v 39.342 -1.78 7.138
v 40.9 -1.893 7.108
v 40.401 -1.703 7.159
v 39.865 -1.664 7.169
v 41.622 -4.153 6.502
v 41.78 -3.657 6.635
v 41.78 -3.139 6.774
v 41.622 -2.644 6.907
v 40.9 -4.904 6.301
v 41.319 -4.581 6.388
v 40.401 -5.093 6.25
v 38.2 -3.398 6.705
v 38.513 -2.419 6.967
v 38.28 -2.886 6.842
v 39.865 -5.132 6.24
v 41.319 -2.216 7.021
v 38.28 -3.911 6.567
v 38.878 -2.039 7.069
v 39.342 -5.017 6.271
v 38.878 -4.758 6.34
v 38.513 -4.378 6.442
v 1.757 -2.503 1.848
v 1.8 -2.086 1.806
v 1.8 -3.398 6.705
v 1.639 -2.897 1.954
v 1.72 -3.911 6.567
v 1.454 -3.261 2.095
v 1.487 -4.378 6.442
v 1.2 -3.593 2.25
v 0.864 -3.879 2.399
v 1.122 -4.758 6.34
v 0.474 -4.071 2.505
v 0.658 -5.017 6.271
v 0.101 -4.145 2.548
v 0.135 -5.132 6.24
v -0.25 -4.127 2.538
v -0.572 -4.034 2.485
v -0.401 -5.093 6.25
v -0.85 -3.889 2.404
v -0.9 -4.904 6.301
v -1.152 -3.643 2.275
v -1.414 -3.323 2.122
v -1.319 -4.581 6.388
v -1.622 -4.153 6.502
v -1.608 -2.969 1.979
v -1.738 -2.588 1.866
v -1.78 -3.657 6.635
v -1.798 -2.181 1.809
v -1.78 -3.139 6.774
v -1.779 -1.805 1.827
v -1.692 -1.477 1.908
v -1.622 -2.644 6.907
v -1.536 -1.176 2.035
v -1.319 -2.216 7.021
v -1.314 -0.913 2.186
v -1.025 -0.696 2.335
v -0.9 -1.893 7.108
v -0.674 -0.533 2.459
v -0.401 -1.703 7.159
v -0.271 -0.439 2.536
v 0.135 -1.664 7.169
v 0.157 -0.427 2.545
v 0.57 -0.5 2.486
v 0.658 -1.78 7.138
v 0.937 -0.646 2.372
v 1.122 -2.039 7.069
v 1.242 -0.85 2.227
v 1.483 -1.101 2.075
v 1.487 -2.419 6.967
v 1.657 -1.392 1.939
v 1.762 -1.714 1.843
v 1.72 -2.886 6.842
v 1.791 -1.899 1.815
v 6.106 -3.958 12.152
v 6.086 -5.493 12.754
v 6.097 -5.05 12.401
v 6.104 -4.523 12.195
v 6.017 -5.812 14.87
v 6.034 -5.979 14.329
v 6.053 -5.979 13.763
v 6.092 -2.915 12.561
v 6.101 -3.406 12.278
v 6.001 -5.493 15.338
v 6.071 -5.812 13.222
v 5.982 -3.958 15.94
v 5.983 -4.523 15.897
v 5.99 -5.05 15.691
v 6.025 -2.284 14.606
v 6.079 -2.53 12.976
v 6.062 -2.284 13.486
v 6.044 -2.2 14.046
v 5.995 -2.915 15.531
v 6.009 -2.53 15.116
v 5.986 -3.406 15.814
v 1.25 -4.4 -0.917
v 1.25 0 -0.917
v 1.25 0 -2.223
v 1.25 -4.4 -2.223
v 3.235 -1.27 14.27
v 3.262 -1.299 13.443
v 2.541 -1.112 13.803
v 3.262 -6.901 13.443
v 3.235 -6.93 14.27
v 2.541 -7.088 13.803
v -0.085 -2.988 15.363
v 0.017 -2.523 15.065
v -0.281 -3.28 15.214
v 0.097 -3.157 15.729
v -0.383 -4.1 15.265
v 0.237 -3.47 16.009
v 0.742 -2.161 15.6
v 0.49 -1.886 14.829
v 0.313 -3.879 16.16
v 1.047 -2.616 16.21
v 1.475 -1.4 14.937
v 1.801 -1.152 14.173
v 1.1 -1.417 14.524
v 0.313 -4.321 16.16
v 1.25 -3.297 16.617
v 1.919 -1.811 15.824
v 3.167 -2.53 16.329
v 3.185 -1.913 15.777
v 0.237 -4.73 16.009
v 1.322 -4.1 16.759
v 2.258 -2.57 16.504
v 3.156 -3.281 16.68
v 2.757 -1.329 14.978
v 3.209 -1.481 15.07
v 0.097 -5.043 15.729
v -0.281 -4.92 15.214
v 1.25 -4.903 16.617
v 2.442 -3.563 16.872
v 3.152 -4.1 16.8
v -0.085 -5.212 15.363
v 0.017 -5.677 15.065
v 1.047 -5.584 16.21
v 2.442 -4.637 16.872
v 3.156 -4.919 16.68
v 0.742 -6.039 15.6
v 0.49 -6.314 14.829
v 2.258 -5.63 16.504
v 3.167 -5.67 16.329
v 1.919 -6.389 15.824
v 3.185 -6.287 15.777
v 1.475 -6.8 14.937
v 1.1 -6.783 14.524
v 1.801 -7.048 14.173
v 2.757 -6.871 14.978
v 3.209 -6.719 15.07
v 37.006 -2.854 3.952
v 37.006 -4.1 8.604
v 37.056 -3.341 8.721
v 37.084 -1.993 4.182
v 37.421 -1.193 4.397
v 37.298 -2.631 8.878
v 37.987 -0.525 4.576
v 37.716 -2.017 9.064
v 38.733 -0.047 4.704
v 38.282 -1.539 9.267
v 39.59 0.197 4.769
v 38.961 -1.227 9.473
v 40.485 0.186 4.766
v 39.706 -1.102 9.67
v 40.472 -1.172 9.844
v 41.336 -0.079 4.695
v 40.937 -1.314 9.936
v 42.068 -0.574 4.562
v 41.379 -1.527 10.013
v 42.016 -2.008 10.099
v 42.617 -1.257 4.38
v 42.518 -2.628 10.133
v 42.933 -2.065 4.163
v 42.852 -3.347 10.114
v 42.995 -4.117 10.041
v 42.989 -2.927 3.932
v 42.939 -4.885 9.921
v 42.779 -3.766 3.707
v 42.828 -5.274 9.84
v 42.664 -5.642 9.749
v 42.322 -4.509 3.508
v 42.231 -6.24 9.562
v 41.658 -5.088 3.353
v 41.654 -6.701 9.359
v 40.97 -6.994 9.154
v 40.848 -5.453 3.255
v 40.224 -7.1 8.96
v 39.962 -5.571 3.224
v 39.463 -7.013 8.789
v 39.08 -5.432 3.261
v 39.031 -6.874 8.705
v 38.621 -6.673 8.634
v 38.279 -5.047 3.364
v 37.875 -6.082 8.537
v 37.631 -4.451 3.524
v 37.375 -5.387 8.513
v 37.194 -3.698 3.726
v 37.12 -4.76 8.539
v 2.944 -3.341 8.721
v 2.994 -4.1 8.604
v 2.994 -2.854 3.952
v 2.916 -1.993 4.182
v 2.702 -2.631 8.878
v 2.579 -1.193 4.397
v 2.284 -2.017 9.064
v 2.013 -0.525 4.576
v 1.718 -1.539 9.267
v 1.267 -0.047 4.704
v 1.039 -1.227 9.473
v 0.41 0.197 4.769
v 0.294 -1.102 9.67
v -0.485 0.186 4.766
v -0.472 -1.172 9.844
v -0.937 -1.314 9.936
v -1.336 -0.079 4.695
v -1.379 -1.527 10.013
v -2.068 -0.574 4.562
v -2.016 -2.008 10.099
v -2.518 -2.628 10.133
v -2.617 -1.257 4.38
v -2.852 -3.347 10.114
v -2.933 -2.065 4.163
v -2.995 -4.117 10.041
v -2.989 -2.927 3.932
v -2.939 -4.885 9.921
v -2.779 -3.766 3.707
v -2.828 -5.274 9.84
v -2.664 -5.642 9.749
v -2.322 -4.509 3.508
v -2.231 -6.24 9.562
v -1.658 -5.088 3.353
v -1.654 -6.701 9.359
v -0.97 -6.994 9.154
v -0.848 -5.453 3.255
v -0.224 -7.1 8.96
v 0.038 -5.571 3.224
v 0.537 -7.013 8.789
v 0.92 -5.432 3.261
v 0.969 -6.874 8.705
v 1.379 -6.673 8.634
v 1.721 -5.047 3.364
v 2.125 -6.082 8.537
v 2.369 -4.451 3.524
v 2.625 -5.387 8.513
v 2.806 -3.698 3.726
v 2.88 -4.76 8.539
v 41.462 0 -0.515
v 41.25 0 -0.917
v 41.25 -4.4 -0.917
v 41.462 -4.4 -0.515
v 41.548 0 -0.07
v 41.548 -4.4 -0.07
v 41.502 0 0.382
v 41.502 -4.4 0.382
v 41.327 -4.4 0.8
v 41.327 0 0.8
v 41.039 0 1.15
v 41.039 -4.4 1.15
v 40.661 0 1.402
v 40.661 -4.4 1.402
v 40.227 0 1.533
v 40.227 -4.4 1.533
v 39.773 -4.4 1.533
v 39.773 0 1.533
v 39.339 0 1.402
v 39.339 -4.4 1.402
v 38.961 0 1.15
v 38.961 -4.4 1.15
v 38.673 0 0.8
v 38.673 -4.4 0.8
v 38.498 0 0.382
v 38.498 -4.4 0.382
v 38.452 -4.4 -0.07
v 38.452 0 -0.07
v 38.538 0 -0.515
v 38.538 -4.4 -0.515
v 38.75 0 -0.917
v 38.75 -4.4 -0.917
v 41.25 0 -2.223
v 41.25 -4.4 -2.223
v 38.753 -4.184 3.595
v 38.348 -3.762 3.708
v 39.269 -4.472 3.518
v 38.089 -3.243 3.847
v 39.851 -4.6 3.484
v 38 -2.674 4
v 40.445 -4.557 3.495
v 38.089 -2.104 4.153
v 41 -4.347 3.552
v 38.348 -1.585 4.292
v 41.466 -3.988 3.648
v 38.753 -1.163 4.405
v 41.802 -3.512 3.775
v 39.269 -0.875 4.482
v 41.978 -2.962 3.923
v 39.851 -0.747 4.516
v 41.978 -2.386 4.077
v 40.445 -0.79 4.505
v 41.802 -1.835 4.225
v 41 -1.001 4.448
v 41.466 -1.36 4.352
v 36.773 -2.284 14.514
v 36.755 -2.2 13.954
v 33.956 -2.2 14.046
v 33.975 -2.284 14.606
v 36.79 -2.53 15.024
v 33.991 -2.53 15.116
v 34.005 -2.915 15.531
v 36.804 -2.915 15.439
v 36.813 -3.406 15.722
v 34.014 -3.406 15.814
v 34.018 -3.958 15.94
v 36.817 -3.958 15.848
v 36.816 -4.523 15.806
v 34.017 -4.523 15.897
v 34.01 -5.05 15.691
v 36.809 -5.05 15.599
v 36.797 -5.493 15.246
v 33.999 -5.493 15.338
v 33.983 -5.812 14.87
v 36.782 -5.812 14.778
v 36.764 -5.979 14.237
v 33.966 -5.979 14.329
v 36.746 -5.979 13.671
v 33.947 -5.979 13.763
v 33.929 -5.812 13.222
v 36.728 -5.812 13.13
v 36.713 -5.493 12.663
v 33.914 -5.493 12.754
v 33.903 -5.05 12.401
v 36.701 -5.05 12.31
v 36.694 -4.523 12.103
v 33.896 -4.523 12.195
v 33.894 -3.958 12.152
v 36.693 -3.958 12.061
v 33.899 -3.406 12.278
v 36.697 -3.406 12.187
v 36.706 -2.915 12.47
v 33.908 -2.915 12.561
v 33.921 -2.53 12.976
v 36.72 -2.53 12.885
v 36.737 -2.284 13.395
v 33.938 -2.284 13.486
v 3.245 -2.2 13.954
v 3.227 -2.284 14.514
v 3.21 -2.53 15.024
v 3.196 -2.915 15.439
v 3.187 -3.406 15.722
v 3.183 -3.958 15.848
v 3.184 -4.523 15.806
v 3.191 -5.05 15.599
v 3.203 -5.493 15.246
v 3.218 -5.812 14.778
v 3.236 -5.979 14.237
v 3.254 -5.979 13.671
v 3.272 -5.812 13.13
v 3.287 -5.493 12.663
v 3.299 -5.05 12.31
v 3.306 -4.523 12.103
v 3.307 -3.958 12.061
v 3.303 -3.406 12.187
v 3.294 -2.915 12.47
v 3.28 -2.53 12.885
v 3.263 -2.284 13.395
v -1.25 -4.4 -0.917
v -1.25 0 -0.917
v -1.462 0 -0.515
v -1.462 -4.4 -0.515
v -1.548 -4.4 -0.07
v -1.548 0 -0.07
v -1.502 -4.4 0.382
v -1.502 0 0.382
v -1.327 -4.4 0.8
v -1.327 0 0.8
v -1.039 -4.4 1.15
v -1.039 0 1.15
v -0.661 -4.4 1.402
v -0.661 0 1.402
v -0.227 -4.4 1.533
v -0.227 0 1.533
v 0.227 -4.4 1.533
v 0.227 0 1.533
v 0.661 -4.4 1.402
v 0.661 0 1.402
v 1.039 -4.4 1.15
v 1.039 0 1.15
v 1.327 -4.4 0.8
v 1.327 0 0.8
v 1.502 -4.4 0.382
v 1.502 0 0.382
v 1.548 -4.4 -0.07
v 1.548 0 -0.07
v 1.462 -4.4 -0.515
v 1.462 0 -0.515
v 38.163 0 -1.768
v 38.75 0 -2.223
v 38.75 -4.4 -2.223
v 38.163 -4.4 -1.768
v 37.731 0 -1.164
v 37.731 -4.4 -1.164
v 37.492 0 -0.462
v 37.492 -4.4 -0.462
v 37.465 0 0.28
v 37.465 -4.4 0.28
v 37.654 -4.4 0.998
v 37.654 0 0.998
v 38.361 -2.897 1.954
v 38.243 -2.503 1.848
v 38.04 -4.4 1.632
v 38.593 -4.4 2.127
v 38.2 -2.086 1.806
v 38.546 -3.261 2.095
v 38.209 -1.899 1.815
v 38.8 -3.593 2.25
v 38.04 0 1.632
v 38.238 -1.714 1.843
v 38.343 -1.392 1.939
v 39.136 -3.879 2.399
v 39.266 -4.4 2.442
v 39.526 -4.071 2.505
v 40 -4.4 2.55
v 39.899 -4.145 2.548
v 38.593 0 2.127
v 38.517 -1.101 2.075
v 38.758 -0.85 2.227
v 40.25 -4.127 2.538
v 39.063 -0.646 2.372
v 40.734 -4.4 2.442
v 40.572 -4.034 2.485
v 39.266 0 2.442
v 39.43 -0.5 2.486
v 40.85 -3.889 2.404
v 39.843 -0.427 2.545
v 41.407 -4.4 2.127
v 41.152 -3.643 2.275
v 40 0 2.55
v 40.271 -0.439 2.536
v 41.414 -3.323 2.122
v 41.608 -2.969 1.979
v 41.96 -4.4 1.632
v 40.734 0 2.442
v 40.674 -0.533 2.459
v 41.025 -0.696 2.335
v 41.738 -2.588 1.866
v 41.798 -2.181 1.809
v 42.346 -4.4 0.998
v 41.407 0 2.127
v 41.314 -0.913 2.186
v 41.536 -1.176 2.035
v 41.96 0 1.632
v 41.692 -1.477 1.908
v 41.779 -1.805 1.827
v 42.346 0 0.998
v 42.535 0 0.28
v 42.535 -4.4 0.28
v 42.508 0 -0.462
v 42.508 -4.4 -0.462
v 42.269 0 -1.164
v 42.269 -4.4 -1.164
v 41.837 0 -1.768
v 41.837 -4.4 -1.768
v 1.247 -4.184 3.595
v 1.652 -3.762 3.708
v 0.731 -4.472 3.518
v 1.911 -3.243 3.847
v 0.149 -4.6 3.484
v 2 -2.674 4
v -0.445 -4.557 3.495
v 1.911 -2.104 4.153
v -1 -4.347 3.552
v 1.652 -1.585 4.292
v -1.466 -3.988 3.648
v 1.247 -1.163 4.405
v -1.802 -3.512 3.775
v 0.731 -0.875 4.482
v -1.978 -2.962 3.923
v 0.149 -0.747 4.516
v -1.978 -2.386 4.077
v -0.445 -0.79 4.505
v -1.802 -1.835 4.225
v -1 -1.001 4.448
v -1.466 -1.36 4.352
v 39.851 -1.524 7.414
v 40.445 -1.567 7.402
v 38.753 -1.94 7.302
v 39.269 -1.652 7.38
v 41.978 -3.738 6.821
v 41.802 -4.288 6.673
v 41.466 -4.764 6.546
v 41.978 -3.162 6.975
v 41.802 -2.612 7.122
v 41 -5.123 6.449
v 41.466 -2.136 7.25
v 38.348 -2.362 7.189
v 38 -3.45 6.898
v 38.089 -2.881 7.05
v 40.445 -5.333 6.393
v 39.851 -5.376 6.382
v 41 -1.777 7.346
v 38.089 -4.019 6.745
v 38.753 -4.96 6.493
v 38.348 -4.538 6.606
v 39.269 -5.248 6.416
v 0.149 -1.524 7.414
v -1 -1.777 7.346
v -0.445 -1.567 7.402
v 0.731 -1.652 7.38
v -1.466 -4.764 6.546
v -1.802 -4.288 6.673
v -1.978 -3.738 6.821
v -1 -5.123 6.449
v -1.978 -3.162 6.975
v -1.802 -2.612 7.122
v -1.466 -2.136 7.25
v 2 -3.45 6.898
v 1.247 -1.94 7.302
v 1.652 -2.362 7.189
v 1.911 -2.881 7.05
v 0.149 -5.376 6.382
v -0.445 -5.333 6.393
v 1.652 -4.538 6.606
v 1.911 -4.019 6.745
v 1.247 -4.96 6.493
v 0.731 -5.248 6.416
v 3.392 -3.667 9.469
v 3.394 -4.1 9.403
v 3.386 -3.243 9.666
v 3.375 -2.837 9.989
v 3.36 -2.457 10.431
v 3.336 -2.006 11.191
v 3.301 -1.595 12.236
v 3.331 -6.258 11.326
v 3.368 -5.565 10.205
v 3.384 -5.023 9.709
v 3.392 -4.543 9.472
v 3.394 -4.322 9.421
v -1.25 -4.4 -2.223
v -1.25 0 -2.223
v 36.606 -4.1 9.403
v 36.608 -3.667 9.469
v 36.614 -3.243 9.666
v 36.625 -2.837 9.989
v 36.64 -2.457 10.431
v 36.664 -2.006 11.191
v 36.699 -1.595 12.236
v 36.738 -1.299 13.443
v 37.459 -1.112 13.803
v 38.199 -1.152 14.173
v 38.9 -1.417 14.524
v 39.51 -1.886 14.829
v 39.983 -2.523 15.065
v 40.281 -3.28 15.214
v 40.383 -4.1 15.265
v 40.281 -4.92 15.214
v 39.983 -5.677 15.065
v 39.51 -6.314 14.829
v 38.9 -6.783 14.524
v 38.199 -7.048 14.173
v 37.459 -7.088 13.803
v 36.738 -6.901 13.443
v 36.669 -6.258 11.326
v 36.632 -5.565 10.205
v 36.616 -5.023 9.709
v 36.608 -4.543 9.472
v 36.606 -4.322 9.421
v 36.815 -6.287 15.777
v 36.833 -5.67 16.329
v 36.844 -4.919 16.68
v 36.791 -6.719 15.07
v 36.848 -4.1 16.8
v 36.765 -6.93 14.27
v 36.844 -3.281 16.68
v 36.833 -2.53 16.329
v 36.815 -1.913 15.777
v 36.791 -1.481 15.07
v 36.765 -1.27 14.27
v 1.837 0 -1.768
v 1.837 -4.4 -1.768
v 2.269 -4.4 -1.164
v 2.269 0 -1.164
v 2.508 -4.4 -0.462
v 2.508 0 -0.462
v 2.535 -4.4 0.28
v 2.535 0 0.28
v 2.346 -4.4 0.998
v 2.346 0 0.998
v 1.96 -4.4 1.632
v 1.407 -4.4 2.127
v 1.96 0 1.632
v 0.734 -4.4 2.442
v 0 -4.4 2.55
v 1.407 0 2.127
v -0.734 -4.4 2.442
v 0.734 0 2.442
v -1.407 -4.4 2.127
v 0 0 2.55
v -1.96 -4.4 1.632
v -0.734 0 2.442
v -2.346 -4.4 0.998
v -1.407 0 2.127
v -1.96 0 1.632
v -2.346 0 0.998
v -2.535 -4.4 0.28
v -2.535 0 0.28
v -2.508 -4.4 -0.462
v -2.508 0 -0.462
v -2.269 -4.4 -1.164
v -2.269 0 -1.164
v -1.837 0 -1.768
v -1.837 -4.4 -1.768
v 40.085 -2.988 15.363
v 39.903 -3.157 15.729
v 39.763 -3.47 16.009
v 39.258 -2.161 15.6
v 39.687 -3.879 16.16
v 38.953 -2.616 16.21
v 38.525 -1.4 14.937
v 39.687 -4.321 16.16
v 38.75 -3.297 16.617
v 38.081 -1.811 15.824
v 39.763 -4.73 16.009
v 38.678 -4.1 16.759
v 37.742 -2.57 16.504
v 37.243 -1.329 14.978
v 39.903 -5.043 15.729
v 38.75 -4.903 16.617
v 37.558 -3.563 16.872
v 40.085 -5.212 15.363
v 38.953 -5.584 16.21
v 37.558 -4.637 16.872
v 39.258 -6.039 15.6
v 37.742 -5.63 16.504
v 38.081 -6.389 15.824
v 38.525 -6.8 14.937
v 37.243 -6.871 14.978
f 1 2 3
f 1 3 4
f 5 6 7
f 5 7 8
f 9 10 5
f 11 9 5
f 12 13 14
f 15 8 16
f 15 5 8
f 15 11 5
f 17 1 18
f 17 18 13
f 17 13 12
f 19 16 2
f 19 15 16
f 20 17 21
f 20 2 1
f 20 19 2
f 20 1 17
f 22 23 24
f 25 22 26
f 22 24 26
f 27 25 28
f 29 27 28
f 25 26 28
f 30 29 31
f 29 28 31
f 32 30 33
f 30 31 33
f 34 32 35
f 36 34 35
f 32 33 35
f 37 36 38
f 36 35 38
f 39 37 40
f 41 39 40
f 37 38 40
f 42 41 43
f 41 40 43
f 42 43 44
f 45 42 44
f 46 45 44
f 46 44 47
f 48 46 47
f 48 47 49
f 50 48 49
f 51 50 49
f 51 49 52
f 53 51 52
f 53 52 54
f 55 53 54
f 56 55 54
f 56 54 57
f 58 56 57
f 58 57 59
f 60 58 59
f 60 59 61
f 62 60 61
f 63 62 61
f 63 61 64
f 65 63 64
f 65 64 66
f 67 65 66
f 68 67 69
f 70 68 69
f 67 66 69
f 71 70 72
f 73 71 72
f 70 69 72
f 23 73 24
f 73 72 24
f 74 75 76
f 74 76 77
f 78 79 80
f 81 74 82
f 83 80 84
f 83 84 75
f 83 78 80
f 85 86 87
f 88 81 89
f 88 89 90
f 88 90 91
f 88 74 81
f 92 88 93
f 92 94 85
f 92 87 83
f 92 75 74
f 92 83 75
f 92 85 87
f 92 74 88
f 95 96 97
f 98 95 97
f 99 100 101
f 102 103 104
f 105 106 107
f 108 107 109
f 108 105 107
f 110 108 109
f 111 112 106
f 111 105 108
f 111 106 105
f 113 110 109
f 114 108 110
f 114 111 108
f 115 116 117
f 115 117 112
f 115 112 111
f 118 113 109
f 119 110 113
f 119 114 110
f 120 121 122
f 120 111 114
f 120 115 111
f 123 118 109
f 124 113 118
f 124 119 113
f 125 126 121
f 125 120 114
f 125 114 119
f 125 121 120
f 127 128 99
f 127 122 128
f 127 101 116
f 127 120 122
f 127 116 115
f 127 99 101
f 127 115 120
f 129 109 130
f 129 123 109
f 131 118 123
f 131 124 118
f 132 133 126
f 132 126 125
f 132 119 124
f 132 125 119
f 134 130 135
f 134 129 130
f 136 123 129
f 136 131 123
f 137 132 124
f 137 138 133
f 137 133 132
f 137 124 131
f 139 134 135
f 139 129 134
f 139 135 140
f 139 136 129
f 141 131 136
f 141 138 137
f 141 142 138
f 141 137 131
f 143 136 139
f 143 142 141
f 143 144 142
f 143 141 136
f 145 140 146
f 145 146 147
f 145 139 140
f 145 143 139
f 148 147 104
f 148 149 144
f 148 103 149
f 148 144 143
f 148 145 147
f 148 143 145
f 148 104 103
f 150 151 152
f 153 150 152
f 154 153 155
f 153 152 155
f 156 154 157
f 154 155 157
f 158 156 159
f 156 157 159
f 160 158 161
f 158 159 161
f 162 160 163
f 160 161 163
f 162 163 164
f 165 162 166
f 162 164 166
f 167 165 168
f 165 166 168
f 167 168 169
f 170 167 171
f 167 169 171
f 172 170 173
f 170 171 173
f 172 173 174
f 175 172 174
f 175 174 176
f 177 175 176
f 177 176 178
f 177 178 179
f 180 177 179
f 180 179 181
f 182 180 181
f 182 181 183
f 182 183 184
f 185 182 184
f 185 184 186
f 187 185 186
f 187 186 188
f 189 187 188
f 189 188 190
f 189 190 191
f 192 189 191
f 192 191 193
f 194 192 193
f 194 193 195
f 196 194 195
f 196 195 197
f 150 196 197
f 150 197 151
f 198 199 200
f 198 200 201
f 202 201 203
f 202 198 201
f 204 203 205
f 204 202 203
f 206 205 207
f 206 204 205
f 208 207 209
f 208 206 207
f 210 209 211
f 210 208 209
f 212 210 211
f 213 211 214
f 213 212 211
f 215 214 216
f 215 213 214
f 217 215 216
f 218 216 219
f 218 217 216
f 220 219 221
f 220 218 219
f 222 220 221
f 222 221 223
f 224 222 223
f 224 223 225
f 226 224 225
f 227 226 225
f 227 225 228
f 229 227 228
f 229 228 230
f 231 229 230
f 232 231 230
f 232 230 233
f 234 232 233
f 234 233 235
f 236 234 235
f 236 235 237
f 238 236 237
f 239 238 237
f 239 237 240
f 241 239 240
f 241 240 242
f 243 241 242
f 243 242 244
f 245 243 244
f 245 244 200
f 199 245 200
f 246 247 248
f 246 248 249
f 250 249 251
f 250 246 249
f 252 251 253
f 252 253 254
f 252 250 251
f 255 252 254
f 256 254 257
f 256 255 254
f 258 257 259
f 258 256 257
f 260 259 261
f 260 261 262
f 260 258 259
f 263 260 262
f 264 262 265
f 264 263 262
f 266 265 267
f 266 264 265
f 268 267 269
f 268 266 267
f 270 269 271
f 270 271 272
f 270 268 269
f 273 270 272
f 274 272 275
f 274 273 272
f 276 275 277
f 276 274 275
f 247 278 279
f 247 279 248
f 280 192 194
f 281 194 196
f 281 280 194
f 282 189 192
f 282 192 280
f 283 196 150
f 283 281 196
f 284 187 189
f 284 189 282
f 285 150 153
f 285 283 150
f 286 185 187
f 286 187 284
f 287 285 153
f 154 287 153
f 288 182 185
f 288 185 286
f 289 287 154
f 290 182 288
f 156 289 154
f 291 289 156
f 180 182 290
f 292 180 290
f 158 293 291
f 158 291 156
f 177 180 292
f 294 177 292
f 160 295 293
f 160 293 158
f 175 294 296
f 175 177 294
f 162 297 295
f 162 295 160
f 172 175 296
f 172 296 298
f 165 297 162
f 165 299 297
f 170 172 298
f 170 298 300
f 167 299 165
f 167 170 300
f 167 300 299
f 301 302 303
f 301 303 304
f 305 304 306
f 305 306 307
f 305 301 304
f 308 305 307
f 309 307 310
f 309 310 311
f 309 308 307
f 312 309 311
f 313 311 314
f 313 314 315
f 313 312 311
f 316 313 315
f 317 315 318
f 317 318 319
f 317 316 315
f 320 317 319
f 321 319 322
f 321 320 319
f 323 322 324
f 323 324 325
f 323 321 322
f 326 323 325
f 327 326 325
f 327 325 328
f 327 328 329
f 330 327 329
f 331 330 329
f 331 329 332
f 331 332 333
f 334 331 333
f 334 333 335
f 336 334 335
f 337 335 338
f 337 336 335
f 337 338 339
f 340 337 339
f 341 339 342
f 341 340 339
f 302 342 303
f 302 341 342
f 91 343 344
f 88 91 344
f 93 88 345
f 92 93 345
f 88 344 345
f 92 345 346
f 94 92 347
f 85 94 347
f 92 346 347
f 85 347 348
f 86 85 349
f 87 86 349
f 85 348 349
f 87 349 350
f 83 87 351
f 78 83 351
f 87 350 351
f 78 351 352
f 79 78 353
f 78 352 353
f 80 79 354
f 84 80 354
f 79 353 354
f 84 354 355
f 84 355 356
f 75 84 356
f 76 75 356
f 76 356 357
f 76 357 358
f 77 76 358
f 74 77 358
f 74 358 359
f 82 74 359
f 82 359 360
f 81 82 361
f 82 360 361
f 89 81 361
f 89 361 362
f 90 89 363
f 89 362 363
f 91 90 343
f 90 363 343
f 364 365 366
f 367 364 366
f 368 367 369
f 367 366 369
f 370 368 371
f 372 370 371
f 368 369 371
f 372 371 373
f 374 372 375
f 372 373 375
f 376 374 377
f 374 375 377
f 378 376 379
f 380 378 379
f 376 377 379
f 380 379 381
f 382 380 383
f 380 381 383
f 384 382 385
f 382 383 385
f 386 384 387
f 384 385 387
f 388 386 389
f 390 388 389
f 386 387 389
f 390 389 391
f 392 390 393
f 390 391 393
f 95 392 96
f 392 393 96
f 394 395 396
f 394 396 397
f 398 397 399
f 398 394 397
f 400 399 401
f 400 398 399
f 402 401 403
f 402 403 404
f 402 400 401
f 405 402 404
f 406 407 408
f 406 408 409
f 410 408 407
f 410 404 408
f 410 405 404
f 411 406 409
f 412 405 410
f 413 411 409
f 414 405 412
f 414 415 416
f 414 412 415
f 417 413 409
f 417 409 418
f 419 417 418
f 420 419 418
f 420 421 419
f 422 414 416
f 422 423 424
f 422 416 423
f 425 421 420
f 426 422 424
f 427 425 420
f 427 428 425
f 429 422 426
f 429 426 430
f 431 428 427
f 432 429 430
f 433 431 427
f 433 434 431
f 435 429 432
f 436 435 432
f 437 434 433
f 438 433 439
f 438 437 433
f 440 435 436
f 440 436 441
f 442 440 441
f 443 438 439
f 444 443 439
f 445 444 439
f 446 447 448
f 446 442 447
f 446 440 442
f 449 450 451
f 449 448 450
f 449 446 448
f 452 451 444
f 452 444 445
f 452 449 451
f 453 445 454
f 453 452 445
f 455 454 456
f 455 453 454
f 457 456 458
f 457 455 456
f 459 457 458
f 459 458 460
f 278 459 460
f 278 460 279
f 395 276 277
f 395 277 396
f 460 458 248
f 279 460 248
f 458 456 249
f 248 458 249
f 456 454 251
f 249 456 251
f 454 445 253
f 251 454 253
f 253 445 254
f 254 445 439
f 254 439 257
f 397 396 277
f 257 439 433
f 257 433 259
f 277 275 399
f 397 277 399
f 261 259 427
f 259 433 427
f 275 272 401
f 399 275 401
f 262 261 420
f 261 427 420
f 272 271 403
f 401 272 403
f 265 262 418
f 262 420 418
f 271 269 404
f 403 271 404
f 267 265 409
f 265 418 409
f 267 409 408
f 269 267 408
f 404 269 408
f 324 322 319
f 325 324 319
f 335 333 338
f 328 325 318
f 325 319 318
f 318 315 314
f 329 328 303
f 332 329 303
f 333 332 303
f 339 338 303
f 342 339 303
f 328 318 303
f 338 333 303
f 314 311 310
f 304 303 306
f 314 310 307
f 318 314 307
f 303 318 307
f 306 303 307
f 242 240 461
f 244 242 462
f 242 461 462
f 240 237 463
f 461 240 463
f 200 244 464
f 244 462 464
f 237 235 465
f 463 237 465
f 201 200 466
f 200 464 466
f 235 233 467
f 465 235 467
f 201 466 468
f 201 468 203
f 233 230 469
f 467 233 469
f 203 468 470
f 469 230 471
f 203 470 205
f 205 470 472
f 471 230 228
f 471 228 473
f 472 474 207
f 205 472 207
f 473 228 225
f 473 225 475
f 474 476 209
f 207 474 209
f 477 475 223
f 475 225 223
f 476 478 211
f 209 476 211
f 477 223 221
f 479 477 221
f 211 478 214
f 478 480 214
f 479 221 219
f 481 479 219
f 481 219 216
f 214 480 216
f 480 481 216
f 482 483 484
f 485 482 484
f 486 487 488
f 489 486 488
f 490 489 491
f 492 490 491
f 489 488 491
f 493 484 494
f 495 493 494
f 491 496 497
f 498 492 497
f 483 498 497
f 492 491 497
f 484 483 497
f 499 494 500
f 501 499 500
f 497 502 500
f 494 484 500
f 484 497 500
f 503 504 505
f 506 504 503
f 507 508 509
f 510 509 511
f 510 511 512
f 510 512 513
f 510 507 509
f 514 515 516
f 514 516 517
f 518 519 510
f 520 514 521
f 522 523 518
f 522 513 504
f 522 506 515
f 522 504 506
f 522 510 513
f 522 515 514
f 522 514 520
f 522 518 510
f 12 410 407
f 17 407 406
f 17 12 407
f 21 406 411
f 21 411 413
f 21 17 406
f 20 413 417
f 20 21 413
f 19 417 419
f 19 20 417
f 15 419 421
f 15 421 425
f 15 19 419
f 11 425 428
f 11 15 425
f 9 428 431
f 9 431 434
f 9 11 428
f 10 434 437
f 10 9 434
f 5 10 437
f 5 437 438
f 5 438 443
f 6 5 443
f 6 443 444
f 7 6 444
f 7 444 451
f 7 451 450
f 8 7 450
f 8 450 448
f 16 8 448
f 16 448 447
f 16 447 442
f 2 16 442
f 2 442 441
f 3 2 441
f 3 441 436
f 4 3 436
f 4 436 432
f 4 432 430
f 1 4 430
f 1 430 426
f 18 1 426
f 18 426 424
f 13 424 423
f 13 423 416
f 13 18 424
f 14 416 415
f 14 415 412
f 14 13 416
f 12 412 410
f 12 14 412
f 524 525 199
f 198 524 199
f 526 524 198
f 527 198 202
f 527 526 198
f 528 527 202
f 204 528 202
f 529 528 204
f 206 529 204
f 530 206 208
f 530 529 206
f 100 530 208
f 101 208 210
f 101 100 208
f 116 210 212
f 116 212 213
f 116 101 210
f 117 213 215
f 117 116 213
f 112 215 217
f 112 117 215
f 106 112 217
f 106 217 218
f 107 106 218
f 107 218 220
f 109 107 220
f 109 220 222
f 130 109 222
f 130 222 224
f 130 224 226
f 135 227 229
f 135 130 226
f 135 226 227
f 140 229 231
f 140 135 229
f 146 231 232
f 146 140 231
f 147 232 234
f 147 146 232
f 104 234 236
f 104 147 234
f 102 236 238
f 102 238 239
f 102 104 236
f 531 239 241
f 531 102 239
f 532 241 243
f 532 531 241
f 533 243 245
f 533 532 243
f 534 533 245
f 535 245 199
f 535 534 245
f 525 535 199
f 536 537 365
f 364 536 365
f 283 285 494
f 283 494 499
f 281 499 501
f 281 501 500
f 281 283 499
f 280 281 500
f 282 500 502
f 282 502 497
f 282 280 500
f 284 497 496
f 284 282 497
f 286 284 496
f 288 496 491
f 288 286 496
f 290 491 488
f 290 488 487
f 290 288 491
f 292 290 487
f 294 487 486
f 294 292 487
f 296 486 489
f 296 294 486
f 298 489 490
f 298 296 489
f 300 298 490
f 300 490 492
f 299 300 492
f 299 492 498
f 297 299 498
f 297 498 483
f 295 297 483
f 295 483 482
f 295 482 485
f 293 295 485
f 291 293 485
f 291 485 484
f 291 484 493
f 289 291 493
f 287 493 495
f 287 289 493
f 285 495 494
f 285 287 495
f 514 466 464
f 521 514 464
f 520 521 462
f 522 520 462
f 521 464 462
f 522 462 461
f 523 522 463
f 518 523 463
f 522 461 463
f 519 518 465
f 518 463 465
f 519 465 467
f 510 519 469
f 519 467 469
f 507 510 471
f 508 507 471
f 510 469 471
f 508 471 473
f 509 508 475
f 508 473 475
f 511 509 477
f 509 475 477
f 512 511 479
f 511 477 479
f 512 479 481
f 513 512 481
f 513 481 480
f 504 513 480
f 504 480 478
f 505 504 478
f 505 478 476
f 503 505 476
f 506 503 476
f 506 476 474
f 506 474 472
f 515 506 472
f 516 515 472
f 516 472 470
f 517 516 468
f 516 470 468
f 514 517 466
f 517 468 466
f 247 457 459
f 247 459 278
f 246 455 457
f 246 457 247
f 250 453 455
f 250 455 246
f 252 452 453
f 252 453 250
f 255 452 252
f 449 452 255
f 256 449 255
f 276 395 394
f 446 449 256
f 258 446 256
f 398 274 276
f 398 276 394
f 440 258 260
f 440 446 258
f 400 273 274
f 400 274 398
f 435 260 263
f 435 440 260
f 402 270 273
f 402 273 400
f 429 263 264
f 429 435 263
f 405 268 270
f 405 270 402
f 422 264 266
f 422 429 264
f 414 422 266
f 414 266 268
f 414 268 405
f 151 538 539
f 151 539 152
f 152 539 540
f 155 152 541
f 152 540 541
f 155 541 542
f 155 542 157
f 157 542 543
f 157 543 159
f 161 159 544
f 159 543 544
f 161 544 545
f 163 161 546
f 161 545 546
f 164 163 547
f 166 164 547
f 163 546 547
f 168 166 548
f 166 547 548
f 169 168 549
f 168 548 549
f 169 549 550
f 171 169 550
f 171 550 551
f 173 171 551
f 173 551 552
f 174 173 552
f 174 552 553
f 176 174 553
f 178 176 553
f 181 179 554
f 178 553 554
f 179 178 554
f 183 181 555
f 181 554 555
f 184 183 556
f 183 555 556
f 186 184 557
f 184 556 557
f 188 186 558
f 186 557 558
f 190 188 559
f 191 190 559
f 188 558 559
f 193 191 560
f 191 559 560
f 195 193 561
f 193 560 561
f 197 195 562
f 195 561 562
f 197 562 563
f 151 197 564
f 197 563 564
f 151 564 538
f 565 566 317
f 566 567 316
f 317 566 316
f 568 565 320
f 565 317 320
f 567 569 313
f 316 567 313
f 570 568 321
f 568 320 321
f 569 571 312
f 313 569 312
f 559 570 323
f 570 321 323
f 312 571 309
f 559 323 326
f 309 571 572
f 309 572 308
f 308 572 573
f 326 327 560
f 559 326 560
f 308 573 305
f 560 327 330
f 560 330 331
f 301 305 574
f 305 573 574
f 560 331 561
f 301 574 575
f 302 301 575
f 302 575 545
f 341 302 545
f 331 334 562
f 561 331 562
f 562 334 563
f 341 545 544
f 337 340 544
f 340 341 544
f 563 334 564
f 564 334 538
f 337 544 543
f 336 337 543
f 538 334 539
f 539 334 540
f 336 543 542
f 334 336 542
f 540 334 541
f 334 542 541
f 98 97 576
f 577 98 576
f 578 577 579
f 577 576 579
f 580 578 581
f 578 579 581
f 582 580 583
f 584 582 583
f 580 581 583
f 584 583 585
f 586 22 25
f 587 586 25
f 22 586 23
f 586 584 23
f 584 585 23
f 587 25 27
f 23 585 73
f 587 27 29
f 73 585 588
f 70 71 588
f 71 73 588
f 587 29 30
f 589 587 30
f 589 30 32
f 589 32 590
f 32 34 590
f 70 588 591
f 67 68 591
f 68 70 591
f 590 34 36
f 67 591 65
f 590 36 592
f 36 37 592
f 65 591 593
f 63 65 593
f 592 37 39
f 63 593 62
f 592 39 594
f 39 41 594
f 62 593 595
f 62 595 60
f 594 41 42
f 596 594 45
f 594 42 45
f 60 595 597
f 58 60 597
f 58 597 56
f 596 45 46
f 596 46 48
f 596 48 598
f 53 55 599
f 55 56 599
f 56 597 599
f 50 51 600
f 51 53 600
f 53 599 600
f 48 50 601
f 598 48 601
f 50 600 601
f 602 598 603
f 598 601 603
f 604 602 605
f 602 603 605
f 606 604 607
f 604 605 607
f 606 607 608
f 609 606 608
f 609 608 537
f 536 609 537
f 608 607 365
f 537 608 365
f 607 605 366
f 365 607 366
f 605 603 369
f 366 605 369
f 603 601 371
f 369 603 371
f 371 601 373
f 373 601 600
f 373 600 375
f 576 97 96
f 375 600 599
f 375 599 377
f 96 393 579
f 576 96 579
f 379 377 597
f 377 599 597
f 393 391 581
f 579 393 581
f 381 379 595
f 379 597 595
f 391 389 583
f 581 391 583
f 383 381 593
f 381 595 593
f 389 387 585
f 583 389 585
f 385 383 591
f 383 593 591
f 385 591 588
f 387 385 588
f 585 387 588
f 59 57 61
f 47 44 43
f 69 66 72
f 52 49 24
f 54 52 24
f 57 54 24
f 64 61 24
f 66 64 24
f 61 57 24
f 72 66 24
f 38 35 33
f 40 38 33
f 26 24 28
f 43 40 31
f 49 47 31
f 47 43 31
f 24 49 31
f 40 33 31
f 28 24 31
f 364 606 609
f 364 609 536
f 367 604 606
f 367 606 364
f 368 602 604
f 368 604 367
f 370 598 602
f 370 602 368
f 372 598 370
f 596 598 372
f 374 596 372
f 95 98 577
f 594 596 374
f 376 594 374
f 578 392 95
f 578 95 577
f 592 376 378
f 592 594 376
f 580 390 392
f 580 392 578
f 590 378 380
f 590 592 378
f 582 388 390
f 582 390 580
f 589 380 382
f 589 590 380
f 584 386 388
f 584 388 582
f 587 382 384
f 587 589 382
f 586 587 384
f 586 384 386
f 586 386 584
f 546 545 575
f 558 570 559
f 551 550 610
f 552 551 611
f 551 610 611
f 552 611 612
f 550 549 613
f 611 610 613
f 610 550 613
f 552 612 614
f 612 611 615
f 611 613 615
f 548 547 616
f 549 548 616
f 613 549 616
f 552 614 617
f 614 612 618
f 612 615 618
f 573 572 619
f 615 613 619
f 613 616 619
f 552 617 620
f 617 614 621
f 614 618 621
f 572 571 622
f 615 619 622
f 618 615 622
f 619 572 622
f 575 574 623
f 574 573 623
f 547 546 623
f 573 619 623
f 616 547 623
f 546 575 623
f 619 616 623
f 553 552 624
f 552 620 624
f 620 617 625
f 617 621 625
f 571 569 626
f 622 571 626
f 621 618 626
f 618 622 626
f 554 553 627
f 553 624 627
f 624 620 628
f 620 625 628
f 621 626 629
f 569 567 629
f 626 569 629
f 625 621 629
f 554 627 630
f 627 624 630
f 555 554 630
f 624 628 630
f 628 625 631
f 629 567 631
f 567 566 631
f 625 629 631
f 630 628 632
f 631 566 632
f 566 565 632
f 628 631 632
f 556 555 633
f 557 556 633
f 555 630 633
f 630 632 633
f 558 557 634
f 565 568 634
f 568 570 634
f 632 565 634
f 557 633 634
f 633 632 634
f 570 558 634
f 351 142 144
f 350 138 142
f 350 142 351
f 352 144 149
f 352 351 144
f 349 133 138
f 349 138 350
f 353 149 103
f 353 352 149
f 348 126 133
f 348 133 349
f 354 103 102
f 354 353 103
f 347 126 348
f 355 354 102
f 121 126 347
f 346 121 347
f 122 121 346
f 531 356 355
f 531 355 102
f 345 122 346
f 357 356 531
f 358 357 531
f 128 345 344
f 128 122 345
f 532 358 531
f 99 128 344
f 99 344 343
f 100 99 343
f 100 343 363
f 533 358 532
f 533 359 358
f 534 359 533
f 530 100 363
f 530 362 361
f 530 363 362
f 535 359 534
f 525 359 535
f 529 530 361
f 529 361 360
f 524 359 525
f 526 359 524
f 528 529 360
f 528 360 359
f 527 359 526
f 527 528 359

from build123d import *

# Parameters (mm, degrees)
F1_DEPTH  = 4.4
F6_R      = 3
F10_R     = 2
F11_DEPTH = 3
F13_R     = 1.8
F16_DEPTH = 25
F17_R     = 1.9
F18_DEPTH = 2.8


with BuildPart() as f1:
    # F0 (on Front) → F1 (new body)
    with BuildSketch(Plane.XZ):
        with BuildLine():
            Line((1.25, -0.916515139), (1.25, -2.2226110771))
            ThreePointArc((1.25, -2.2226110771), (0, 2.55), (-1.25, -2.2226110771))
            Line((-1.25, -2.2226110771), (-1.25, -0.916515139))
            ThreePointArc((-1.25, -0.916515139), (0, 1.55), (1.25, -0.916515139))
        make_face()
    extrude(amount=F1_DEPTH)

    # F13 (on offset) → F14 (join, up to the next surface of F1)
    with BuildSketch(Plane(origin=(0, -1.90378939, 7.1050387303), x_dir=(1, 0, 0), z_dir=(0, 0.2588190451, -0.9659258263))):
        with Locations((0, 1.5472061438)):
            Circle(F13_R)
    extrude(until=Until.NEXT)


with BuildPart() as f7:
    # F7: sweep along a path in F7_path
    with BuildLine(Plane(origin=(0, -2.6735824366, 4), x_dir=(-0.8814124167, -0.4723474905, 0), z_dir=(0.4597008434, -0.8578134519, -0.2298504217))) as f7_path:
        Line((0, 0), (0.6737647565, -5.4699144883))
        Line((0.6737647565, -5.4699144883), (-1.3534838018, -10.1964632591))
    # F6 (on line) → F7 (sweep)
    with BuildSketch(Plane(origin=(6.0293851278, 0, 12.0587702557), x_dir=(0.894427191, 0, -0.4472135955), z_dir=(0.4472135955, 0, 0.894427191))):
        with Locations((-4.16957933, -4.1)):
            Circle(F6_R)
    sweep(path=f7_path.line, transition=Transition.RIGHT)

    # F8 (on face) → F9 (revolve)
    with BuildSketch(Plane(origin=(6.0293851278, 0, 12.0587702557), x_dir=(0.894427191, 0, -0.4472135955), z_dir=(0.4472135955, 0, 0.894427191))):
        with BuildLine():
            Line((-1.16957933, -4.1), (-7.16957933, -4.1))
            ThreePointArc((-7.16957933, -4.1), (-4.16957933, -7.1), (-1.16957933, -4.1))
        make_face()
    revolve(axis=Axis((2.3, -4.1, 13.9234628196), (0.894427191, 0, -0.4472135955)))

    # F10 (on face) → F11 (cut)
    with BuildSketch(Plane(origin=(0, -1.1790960637, 4.4004464167), x_dir=(1, 0, 0), z_dir=(0, 0.2588190451, -0.9659258263))):
        with Locations((0, 1.5472061438)):
            Circle(F10_R)
    extrude(amount=-F11_DEPTH, mode=Mode.SUBTRACT)

    # F15 (on Front) → F16 (cut)
    with BuildSketch(Plane.XZ):
        Polygon((19.7431911525, 6.4305428985), (14.3870584792, 19.6048300817), (3.1383610708, 17.2138456373), (3.6037557404, 3), align=None)
    extrude(amount=F16_DEPTH, mode=Mode.SUBTRACT)

    # F17 (on face) → F18 (join)
    with BuildSketch(Plane(origin=(3.6980182798, 0, 0.1210817987), x_dir=(0, 1, 0), z_dir=(0.9994644, 0, 0.0327248104))):
        with Locations((-4.1, 13.8407383482)):
            Circle(F17_R)
    extrude(amount=F18_DEPTH)


with BuildPart() as f20_1:
    # F20: instance of F7
    add(f7.part.mirror(Plane.YZ.offset(20)))


with BuildPart() as f20_2:
    # F20: instance of F1
    add(f1.part.mirror(Plane.YZ.offset(20)))


solid = Compound([f1.part, f7.part, f20_1.part, f20_2.part])
